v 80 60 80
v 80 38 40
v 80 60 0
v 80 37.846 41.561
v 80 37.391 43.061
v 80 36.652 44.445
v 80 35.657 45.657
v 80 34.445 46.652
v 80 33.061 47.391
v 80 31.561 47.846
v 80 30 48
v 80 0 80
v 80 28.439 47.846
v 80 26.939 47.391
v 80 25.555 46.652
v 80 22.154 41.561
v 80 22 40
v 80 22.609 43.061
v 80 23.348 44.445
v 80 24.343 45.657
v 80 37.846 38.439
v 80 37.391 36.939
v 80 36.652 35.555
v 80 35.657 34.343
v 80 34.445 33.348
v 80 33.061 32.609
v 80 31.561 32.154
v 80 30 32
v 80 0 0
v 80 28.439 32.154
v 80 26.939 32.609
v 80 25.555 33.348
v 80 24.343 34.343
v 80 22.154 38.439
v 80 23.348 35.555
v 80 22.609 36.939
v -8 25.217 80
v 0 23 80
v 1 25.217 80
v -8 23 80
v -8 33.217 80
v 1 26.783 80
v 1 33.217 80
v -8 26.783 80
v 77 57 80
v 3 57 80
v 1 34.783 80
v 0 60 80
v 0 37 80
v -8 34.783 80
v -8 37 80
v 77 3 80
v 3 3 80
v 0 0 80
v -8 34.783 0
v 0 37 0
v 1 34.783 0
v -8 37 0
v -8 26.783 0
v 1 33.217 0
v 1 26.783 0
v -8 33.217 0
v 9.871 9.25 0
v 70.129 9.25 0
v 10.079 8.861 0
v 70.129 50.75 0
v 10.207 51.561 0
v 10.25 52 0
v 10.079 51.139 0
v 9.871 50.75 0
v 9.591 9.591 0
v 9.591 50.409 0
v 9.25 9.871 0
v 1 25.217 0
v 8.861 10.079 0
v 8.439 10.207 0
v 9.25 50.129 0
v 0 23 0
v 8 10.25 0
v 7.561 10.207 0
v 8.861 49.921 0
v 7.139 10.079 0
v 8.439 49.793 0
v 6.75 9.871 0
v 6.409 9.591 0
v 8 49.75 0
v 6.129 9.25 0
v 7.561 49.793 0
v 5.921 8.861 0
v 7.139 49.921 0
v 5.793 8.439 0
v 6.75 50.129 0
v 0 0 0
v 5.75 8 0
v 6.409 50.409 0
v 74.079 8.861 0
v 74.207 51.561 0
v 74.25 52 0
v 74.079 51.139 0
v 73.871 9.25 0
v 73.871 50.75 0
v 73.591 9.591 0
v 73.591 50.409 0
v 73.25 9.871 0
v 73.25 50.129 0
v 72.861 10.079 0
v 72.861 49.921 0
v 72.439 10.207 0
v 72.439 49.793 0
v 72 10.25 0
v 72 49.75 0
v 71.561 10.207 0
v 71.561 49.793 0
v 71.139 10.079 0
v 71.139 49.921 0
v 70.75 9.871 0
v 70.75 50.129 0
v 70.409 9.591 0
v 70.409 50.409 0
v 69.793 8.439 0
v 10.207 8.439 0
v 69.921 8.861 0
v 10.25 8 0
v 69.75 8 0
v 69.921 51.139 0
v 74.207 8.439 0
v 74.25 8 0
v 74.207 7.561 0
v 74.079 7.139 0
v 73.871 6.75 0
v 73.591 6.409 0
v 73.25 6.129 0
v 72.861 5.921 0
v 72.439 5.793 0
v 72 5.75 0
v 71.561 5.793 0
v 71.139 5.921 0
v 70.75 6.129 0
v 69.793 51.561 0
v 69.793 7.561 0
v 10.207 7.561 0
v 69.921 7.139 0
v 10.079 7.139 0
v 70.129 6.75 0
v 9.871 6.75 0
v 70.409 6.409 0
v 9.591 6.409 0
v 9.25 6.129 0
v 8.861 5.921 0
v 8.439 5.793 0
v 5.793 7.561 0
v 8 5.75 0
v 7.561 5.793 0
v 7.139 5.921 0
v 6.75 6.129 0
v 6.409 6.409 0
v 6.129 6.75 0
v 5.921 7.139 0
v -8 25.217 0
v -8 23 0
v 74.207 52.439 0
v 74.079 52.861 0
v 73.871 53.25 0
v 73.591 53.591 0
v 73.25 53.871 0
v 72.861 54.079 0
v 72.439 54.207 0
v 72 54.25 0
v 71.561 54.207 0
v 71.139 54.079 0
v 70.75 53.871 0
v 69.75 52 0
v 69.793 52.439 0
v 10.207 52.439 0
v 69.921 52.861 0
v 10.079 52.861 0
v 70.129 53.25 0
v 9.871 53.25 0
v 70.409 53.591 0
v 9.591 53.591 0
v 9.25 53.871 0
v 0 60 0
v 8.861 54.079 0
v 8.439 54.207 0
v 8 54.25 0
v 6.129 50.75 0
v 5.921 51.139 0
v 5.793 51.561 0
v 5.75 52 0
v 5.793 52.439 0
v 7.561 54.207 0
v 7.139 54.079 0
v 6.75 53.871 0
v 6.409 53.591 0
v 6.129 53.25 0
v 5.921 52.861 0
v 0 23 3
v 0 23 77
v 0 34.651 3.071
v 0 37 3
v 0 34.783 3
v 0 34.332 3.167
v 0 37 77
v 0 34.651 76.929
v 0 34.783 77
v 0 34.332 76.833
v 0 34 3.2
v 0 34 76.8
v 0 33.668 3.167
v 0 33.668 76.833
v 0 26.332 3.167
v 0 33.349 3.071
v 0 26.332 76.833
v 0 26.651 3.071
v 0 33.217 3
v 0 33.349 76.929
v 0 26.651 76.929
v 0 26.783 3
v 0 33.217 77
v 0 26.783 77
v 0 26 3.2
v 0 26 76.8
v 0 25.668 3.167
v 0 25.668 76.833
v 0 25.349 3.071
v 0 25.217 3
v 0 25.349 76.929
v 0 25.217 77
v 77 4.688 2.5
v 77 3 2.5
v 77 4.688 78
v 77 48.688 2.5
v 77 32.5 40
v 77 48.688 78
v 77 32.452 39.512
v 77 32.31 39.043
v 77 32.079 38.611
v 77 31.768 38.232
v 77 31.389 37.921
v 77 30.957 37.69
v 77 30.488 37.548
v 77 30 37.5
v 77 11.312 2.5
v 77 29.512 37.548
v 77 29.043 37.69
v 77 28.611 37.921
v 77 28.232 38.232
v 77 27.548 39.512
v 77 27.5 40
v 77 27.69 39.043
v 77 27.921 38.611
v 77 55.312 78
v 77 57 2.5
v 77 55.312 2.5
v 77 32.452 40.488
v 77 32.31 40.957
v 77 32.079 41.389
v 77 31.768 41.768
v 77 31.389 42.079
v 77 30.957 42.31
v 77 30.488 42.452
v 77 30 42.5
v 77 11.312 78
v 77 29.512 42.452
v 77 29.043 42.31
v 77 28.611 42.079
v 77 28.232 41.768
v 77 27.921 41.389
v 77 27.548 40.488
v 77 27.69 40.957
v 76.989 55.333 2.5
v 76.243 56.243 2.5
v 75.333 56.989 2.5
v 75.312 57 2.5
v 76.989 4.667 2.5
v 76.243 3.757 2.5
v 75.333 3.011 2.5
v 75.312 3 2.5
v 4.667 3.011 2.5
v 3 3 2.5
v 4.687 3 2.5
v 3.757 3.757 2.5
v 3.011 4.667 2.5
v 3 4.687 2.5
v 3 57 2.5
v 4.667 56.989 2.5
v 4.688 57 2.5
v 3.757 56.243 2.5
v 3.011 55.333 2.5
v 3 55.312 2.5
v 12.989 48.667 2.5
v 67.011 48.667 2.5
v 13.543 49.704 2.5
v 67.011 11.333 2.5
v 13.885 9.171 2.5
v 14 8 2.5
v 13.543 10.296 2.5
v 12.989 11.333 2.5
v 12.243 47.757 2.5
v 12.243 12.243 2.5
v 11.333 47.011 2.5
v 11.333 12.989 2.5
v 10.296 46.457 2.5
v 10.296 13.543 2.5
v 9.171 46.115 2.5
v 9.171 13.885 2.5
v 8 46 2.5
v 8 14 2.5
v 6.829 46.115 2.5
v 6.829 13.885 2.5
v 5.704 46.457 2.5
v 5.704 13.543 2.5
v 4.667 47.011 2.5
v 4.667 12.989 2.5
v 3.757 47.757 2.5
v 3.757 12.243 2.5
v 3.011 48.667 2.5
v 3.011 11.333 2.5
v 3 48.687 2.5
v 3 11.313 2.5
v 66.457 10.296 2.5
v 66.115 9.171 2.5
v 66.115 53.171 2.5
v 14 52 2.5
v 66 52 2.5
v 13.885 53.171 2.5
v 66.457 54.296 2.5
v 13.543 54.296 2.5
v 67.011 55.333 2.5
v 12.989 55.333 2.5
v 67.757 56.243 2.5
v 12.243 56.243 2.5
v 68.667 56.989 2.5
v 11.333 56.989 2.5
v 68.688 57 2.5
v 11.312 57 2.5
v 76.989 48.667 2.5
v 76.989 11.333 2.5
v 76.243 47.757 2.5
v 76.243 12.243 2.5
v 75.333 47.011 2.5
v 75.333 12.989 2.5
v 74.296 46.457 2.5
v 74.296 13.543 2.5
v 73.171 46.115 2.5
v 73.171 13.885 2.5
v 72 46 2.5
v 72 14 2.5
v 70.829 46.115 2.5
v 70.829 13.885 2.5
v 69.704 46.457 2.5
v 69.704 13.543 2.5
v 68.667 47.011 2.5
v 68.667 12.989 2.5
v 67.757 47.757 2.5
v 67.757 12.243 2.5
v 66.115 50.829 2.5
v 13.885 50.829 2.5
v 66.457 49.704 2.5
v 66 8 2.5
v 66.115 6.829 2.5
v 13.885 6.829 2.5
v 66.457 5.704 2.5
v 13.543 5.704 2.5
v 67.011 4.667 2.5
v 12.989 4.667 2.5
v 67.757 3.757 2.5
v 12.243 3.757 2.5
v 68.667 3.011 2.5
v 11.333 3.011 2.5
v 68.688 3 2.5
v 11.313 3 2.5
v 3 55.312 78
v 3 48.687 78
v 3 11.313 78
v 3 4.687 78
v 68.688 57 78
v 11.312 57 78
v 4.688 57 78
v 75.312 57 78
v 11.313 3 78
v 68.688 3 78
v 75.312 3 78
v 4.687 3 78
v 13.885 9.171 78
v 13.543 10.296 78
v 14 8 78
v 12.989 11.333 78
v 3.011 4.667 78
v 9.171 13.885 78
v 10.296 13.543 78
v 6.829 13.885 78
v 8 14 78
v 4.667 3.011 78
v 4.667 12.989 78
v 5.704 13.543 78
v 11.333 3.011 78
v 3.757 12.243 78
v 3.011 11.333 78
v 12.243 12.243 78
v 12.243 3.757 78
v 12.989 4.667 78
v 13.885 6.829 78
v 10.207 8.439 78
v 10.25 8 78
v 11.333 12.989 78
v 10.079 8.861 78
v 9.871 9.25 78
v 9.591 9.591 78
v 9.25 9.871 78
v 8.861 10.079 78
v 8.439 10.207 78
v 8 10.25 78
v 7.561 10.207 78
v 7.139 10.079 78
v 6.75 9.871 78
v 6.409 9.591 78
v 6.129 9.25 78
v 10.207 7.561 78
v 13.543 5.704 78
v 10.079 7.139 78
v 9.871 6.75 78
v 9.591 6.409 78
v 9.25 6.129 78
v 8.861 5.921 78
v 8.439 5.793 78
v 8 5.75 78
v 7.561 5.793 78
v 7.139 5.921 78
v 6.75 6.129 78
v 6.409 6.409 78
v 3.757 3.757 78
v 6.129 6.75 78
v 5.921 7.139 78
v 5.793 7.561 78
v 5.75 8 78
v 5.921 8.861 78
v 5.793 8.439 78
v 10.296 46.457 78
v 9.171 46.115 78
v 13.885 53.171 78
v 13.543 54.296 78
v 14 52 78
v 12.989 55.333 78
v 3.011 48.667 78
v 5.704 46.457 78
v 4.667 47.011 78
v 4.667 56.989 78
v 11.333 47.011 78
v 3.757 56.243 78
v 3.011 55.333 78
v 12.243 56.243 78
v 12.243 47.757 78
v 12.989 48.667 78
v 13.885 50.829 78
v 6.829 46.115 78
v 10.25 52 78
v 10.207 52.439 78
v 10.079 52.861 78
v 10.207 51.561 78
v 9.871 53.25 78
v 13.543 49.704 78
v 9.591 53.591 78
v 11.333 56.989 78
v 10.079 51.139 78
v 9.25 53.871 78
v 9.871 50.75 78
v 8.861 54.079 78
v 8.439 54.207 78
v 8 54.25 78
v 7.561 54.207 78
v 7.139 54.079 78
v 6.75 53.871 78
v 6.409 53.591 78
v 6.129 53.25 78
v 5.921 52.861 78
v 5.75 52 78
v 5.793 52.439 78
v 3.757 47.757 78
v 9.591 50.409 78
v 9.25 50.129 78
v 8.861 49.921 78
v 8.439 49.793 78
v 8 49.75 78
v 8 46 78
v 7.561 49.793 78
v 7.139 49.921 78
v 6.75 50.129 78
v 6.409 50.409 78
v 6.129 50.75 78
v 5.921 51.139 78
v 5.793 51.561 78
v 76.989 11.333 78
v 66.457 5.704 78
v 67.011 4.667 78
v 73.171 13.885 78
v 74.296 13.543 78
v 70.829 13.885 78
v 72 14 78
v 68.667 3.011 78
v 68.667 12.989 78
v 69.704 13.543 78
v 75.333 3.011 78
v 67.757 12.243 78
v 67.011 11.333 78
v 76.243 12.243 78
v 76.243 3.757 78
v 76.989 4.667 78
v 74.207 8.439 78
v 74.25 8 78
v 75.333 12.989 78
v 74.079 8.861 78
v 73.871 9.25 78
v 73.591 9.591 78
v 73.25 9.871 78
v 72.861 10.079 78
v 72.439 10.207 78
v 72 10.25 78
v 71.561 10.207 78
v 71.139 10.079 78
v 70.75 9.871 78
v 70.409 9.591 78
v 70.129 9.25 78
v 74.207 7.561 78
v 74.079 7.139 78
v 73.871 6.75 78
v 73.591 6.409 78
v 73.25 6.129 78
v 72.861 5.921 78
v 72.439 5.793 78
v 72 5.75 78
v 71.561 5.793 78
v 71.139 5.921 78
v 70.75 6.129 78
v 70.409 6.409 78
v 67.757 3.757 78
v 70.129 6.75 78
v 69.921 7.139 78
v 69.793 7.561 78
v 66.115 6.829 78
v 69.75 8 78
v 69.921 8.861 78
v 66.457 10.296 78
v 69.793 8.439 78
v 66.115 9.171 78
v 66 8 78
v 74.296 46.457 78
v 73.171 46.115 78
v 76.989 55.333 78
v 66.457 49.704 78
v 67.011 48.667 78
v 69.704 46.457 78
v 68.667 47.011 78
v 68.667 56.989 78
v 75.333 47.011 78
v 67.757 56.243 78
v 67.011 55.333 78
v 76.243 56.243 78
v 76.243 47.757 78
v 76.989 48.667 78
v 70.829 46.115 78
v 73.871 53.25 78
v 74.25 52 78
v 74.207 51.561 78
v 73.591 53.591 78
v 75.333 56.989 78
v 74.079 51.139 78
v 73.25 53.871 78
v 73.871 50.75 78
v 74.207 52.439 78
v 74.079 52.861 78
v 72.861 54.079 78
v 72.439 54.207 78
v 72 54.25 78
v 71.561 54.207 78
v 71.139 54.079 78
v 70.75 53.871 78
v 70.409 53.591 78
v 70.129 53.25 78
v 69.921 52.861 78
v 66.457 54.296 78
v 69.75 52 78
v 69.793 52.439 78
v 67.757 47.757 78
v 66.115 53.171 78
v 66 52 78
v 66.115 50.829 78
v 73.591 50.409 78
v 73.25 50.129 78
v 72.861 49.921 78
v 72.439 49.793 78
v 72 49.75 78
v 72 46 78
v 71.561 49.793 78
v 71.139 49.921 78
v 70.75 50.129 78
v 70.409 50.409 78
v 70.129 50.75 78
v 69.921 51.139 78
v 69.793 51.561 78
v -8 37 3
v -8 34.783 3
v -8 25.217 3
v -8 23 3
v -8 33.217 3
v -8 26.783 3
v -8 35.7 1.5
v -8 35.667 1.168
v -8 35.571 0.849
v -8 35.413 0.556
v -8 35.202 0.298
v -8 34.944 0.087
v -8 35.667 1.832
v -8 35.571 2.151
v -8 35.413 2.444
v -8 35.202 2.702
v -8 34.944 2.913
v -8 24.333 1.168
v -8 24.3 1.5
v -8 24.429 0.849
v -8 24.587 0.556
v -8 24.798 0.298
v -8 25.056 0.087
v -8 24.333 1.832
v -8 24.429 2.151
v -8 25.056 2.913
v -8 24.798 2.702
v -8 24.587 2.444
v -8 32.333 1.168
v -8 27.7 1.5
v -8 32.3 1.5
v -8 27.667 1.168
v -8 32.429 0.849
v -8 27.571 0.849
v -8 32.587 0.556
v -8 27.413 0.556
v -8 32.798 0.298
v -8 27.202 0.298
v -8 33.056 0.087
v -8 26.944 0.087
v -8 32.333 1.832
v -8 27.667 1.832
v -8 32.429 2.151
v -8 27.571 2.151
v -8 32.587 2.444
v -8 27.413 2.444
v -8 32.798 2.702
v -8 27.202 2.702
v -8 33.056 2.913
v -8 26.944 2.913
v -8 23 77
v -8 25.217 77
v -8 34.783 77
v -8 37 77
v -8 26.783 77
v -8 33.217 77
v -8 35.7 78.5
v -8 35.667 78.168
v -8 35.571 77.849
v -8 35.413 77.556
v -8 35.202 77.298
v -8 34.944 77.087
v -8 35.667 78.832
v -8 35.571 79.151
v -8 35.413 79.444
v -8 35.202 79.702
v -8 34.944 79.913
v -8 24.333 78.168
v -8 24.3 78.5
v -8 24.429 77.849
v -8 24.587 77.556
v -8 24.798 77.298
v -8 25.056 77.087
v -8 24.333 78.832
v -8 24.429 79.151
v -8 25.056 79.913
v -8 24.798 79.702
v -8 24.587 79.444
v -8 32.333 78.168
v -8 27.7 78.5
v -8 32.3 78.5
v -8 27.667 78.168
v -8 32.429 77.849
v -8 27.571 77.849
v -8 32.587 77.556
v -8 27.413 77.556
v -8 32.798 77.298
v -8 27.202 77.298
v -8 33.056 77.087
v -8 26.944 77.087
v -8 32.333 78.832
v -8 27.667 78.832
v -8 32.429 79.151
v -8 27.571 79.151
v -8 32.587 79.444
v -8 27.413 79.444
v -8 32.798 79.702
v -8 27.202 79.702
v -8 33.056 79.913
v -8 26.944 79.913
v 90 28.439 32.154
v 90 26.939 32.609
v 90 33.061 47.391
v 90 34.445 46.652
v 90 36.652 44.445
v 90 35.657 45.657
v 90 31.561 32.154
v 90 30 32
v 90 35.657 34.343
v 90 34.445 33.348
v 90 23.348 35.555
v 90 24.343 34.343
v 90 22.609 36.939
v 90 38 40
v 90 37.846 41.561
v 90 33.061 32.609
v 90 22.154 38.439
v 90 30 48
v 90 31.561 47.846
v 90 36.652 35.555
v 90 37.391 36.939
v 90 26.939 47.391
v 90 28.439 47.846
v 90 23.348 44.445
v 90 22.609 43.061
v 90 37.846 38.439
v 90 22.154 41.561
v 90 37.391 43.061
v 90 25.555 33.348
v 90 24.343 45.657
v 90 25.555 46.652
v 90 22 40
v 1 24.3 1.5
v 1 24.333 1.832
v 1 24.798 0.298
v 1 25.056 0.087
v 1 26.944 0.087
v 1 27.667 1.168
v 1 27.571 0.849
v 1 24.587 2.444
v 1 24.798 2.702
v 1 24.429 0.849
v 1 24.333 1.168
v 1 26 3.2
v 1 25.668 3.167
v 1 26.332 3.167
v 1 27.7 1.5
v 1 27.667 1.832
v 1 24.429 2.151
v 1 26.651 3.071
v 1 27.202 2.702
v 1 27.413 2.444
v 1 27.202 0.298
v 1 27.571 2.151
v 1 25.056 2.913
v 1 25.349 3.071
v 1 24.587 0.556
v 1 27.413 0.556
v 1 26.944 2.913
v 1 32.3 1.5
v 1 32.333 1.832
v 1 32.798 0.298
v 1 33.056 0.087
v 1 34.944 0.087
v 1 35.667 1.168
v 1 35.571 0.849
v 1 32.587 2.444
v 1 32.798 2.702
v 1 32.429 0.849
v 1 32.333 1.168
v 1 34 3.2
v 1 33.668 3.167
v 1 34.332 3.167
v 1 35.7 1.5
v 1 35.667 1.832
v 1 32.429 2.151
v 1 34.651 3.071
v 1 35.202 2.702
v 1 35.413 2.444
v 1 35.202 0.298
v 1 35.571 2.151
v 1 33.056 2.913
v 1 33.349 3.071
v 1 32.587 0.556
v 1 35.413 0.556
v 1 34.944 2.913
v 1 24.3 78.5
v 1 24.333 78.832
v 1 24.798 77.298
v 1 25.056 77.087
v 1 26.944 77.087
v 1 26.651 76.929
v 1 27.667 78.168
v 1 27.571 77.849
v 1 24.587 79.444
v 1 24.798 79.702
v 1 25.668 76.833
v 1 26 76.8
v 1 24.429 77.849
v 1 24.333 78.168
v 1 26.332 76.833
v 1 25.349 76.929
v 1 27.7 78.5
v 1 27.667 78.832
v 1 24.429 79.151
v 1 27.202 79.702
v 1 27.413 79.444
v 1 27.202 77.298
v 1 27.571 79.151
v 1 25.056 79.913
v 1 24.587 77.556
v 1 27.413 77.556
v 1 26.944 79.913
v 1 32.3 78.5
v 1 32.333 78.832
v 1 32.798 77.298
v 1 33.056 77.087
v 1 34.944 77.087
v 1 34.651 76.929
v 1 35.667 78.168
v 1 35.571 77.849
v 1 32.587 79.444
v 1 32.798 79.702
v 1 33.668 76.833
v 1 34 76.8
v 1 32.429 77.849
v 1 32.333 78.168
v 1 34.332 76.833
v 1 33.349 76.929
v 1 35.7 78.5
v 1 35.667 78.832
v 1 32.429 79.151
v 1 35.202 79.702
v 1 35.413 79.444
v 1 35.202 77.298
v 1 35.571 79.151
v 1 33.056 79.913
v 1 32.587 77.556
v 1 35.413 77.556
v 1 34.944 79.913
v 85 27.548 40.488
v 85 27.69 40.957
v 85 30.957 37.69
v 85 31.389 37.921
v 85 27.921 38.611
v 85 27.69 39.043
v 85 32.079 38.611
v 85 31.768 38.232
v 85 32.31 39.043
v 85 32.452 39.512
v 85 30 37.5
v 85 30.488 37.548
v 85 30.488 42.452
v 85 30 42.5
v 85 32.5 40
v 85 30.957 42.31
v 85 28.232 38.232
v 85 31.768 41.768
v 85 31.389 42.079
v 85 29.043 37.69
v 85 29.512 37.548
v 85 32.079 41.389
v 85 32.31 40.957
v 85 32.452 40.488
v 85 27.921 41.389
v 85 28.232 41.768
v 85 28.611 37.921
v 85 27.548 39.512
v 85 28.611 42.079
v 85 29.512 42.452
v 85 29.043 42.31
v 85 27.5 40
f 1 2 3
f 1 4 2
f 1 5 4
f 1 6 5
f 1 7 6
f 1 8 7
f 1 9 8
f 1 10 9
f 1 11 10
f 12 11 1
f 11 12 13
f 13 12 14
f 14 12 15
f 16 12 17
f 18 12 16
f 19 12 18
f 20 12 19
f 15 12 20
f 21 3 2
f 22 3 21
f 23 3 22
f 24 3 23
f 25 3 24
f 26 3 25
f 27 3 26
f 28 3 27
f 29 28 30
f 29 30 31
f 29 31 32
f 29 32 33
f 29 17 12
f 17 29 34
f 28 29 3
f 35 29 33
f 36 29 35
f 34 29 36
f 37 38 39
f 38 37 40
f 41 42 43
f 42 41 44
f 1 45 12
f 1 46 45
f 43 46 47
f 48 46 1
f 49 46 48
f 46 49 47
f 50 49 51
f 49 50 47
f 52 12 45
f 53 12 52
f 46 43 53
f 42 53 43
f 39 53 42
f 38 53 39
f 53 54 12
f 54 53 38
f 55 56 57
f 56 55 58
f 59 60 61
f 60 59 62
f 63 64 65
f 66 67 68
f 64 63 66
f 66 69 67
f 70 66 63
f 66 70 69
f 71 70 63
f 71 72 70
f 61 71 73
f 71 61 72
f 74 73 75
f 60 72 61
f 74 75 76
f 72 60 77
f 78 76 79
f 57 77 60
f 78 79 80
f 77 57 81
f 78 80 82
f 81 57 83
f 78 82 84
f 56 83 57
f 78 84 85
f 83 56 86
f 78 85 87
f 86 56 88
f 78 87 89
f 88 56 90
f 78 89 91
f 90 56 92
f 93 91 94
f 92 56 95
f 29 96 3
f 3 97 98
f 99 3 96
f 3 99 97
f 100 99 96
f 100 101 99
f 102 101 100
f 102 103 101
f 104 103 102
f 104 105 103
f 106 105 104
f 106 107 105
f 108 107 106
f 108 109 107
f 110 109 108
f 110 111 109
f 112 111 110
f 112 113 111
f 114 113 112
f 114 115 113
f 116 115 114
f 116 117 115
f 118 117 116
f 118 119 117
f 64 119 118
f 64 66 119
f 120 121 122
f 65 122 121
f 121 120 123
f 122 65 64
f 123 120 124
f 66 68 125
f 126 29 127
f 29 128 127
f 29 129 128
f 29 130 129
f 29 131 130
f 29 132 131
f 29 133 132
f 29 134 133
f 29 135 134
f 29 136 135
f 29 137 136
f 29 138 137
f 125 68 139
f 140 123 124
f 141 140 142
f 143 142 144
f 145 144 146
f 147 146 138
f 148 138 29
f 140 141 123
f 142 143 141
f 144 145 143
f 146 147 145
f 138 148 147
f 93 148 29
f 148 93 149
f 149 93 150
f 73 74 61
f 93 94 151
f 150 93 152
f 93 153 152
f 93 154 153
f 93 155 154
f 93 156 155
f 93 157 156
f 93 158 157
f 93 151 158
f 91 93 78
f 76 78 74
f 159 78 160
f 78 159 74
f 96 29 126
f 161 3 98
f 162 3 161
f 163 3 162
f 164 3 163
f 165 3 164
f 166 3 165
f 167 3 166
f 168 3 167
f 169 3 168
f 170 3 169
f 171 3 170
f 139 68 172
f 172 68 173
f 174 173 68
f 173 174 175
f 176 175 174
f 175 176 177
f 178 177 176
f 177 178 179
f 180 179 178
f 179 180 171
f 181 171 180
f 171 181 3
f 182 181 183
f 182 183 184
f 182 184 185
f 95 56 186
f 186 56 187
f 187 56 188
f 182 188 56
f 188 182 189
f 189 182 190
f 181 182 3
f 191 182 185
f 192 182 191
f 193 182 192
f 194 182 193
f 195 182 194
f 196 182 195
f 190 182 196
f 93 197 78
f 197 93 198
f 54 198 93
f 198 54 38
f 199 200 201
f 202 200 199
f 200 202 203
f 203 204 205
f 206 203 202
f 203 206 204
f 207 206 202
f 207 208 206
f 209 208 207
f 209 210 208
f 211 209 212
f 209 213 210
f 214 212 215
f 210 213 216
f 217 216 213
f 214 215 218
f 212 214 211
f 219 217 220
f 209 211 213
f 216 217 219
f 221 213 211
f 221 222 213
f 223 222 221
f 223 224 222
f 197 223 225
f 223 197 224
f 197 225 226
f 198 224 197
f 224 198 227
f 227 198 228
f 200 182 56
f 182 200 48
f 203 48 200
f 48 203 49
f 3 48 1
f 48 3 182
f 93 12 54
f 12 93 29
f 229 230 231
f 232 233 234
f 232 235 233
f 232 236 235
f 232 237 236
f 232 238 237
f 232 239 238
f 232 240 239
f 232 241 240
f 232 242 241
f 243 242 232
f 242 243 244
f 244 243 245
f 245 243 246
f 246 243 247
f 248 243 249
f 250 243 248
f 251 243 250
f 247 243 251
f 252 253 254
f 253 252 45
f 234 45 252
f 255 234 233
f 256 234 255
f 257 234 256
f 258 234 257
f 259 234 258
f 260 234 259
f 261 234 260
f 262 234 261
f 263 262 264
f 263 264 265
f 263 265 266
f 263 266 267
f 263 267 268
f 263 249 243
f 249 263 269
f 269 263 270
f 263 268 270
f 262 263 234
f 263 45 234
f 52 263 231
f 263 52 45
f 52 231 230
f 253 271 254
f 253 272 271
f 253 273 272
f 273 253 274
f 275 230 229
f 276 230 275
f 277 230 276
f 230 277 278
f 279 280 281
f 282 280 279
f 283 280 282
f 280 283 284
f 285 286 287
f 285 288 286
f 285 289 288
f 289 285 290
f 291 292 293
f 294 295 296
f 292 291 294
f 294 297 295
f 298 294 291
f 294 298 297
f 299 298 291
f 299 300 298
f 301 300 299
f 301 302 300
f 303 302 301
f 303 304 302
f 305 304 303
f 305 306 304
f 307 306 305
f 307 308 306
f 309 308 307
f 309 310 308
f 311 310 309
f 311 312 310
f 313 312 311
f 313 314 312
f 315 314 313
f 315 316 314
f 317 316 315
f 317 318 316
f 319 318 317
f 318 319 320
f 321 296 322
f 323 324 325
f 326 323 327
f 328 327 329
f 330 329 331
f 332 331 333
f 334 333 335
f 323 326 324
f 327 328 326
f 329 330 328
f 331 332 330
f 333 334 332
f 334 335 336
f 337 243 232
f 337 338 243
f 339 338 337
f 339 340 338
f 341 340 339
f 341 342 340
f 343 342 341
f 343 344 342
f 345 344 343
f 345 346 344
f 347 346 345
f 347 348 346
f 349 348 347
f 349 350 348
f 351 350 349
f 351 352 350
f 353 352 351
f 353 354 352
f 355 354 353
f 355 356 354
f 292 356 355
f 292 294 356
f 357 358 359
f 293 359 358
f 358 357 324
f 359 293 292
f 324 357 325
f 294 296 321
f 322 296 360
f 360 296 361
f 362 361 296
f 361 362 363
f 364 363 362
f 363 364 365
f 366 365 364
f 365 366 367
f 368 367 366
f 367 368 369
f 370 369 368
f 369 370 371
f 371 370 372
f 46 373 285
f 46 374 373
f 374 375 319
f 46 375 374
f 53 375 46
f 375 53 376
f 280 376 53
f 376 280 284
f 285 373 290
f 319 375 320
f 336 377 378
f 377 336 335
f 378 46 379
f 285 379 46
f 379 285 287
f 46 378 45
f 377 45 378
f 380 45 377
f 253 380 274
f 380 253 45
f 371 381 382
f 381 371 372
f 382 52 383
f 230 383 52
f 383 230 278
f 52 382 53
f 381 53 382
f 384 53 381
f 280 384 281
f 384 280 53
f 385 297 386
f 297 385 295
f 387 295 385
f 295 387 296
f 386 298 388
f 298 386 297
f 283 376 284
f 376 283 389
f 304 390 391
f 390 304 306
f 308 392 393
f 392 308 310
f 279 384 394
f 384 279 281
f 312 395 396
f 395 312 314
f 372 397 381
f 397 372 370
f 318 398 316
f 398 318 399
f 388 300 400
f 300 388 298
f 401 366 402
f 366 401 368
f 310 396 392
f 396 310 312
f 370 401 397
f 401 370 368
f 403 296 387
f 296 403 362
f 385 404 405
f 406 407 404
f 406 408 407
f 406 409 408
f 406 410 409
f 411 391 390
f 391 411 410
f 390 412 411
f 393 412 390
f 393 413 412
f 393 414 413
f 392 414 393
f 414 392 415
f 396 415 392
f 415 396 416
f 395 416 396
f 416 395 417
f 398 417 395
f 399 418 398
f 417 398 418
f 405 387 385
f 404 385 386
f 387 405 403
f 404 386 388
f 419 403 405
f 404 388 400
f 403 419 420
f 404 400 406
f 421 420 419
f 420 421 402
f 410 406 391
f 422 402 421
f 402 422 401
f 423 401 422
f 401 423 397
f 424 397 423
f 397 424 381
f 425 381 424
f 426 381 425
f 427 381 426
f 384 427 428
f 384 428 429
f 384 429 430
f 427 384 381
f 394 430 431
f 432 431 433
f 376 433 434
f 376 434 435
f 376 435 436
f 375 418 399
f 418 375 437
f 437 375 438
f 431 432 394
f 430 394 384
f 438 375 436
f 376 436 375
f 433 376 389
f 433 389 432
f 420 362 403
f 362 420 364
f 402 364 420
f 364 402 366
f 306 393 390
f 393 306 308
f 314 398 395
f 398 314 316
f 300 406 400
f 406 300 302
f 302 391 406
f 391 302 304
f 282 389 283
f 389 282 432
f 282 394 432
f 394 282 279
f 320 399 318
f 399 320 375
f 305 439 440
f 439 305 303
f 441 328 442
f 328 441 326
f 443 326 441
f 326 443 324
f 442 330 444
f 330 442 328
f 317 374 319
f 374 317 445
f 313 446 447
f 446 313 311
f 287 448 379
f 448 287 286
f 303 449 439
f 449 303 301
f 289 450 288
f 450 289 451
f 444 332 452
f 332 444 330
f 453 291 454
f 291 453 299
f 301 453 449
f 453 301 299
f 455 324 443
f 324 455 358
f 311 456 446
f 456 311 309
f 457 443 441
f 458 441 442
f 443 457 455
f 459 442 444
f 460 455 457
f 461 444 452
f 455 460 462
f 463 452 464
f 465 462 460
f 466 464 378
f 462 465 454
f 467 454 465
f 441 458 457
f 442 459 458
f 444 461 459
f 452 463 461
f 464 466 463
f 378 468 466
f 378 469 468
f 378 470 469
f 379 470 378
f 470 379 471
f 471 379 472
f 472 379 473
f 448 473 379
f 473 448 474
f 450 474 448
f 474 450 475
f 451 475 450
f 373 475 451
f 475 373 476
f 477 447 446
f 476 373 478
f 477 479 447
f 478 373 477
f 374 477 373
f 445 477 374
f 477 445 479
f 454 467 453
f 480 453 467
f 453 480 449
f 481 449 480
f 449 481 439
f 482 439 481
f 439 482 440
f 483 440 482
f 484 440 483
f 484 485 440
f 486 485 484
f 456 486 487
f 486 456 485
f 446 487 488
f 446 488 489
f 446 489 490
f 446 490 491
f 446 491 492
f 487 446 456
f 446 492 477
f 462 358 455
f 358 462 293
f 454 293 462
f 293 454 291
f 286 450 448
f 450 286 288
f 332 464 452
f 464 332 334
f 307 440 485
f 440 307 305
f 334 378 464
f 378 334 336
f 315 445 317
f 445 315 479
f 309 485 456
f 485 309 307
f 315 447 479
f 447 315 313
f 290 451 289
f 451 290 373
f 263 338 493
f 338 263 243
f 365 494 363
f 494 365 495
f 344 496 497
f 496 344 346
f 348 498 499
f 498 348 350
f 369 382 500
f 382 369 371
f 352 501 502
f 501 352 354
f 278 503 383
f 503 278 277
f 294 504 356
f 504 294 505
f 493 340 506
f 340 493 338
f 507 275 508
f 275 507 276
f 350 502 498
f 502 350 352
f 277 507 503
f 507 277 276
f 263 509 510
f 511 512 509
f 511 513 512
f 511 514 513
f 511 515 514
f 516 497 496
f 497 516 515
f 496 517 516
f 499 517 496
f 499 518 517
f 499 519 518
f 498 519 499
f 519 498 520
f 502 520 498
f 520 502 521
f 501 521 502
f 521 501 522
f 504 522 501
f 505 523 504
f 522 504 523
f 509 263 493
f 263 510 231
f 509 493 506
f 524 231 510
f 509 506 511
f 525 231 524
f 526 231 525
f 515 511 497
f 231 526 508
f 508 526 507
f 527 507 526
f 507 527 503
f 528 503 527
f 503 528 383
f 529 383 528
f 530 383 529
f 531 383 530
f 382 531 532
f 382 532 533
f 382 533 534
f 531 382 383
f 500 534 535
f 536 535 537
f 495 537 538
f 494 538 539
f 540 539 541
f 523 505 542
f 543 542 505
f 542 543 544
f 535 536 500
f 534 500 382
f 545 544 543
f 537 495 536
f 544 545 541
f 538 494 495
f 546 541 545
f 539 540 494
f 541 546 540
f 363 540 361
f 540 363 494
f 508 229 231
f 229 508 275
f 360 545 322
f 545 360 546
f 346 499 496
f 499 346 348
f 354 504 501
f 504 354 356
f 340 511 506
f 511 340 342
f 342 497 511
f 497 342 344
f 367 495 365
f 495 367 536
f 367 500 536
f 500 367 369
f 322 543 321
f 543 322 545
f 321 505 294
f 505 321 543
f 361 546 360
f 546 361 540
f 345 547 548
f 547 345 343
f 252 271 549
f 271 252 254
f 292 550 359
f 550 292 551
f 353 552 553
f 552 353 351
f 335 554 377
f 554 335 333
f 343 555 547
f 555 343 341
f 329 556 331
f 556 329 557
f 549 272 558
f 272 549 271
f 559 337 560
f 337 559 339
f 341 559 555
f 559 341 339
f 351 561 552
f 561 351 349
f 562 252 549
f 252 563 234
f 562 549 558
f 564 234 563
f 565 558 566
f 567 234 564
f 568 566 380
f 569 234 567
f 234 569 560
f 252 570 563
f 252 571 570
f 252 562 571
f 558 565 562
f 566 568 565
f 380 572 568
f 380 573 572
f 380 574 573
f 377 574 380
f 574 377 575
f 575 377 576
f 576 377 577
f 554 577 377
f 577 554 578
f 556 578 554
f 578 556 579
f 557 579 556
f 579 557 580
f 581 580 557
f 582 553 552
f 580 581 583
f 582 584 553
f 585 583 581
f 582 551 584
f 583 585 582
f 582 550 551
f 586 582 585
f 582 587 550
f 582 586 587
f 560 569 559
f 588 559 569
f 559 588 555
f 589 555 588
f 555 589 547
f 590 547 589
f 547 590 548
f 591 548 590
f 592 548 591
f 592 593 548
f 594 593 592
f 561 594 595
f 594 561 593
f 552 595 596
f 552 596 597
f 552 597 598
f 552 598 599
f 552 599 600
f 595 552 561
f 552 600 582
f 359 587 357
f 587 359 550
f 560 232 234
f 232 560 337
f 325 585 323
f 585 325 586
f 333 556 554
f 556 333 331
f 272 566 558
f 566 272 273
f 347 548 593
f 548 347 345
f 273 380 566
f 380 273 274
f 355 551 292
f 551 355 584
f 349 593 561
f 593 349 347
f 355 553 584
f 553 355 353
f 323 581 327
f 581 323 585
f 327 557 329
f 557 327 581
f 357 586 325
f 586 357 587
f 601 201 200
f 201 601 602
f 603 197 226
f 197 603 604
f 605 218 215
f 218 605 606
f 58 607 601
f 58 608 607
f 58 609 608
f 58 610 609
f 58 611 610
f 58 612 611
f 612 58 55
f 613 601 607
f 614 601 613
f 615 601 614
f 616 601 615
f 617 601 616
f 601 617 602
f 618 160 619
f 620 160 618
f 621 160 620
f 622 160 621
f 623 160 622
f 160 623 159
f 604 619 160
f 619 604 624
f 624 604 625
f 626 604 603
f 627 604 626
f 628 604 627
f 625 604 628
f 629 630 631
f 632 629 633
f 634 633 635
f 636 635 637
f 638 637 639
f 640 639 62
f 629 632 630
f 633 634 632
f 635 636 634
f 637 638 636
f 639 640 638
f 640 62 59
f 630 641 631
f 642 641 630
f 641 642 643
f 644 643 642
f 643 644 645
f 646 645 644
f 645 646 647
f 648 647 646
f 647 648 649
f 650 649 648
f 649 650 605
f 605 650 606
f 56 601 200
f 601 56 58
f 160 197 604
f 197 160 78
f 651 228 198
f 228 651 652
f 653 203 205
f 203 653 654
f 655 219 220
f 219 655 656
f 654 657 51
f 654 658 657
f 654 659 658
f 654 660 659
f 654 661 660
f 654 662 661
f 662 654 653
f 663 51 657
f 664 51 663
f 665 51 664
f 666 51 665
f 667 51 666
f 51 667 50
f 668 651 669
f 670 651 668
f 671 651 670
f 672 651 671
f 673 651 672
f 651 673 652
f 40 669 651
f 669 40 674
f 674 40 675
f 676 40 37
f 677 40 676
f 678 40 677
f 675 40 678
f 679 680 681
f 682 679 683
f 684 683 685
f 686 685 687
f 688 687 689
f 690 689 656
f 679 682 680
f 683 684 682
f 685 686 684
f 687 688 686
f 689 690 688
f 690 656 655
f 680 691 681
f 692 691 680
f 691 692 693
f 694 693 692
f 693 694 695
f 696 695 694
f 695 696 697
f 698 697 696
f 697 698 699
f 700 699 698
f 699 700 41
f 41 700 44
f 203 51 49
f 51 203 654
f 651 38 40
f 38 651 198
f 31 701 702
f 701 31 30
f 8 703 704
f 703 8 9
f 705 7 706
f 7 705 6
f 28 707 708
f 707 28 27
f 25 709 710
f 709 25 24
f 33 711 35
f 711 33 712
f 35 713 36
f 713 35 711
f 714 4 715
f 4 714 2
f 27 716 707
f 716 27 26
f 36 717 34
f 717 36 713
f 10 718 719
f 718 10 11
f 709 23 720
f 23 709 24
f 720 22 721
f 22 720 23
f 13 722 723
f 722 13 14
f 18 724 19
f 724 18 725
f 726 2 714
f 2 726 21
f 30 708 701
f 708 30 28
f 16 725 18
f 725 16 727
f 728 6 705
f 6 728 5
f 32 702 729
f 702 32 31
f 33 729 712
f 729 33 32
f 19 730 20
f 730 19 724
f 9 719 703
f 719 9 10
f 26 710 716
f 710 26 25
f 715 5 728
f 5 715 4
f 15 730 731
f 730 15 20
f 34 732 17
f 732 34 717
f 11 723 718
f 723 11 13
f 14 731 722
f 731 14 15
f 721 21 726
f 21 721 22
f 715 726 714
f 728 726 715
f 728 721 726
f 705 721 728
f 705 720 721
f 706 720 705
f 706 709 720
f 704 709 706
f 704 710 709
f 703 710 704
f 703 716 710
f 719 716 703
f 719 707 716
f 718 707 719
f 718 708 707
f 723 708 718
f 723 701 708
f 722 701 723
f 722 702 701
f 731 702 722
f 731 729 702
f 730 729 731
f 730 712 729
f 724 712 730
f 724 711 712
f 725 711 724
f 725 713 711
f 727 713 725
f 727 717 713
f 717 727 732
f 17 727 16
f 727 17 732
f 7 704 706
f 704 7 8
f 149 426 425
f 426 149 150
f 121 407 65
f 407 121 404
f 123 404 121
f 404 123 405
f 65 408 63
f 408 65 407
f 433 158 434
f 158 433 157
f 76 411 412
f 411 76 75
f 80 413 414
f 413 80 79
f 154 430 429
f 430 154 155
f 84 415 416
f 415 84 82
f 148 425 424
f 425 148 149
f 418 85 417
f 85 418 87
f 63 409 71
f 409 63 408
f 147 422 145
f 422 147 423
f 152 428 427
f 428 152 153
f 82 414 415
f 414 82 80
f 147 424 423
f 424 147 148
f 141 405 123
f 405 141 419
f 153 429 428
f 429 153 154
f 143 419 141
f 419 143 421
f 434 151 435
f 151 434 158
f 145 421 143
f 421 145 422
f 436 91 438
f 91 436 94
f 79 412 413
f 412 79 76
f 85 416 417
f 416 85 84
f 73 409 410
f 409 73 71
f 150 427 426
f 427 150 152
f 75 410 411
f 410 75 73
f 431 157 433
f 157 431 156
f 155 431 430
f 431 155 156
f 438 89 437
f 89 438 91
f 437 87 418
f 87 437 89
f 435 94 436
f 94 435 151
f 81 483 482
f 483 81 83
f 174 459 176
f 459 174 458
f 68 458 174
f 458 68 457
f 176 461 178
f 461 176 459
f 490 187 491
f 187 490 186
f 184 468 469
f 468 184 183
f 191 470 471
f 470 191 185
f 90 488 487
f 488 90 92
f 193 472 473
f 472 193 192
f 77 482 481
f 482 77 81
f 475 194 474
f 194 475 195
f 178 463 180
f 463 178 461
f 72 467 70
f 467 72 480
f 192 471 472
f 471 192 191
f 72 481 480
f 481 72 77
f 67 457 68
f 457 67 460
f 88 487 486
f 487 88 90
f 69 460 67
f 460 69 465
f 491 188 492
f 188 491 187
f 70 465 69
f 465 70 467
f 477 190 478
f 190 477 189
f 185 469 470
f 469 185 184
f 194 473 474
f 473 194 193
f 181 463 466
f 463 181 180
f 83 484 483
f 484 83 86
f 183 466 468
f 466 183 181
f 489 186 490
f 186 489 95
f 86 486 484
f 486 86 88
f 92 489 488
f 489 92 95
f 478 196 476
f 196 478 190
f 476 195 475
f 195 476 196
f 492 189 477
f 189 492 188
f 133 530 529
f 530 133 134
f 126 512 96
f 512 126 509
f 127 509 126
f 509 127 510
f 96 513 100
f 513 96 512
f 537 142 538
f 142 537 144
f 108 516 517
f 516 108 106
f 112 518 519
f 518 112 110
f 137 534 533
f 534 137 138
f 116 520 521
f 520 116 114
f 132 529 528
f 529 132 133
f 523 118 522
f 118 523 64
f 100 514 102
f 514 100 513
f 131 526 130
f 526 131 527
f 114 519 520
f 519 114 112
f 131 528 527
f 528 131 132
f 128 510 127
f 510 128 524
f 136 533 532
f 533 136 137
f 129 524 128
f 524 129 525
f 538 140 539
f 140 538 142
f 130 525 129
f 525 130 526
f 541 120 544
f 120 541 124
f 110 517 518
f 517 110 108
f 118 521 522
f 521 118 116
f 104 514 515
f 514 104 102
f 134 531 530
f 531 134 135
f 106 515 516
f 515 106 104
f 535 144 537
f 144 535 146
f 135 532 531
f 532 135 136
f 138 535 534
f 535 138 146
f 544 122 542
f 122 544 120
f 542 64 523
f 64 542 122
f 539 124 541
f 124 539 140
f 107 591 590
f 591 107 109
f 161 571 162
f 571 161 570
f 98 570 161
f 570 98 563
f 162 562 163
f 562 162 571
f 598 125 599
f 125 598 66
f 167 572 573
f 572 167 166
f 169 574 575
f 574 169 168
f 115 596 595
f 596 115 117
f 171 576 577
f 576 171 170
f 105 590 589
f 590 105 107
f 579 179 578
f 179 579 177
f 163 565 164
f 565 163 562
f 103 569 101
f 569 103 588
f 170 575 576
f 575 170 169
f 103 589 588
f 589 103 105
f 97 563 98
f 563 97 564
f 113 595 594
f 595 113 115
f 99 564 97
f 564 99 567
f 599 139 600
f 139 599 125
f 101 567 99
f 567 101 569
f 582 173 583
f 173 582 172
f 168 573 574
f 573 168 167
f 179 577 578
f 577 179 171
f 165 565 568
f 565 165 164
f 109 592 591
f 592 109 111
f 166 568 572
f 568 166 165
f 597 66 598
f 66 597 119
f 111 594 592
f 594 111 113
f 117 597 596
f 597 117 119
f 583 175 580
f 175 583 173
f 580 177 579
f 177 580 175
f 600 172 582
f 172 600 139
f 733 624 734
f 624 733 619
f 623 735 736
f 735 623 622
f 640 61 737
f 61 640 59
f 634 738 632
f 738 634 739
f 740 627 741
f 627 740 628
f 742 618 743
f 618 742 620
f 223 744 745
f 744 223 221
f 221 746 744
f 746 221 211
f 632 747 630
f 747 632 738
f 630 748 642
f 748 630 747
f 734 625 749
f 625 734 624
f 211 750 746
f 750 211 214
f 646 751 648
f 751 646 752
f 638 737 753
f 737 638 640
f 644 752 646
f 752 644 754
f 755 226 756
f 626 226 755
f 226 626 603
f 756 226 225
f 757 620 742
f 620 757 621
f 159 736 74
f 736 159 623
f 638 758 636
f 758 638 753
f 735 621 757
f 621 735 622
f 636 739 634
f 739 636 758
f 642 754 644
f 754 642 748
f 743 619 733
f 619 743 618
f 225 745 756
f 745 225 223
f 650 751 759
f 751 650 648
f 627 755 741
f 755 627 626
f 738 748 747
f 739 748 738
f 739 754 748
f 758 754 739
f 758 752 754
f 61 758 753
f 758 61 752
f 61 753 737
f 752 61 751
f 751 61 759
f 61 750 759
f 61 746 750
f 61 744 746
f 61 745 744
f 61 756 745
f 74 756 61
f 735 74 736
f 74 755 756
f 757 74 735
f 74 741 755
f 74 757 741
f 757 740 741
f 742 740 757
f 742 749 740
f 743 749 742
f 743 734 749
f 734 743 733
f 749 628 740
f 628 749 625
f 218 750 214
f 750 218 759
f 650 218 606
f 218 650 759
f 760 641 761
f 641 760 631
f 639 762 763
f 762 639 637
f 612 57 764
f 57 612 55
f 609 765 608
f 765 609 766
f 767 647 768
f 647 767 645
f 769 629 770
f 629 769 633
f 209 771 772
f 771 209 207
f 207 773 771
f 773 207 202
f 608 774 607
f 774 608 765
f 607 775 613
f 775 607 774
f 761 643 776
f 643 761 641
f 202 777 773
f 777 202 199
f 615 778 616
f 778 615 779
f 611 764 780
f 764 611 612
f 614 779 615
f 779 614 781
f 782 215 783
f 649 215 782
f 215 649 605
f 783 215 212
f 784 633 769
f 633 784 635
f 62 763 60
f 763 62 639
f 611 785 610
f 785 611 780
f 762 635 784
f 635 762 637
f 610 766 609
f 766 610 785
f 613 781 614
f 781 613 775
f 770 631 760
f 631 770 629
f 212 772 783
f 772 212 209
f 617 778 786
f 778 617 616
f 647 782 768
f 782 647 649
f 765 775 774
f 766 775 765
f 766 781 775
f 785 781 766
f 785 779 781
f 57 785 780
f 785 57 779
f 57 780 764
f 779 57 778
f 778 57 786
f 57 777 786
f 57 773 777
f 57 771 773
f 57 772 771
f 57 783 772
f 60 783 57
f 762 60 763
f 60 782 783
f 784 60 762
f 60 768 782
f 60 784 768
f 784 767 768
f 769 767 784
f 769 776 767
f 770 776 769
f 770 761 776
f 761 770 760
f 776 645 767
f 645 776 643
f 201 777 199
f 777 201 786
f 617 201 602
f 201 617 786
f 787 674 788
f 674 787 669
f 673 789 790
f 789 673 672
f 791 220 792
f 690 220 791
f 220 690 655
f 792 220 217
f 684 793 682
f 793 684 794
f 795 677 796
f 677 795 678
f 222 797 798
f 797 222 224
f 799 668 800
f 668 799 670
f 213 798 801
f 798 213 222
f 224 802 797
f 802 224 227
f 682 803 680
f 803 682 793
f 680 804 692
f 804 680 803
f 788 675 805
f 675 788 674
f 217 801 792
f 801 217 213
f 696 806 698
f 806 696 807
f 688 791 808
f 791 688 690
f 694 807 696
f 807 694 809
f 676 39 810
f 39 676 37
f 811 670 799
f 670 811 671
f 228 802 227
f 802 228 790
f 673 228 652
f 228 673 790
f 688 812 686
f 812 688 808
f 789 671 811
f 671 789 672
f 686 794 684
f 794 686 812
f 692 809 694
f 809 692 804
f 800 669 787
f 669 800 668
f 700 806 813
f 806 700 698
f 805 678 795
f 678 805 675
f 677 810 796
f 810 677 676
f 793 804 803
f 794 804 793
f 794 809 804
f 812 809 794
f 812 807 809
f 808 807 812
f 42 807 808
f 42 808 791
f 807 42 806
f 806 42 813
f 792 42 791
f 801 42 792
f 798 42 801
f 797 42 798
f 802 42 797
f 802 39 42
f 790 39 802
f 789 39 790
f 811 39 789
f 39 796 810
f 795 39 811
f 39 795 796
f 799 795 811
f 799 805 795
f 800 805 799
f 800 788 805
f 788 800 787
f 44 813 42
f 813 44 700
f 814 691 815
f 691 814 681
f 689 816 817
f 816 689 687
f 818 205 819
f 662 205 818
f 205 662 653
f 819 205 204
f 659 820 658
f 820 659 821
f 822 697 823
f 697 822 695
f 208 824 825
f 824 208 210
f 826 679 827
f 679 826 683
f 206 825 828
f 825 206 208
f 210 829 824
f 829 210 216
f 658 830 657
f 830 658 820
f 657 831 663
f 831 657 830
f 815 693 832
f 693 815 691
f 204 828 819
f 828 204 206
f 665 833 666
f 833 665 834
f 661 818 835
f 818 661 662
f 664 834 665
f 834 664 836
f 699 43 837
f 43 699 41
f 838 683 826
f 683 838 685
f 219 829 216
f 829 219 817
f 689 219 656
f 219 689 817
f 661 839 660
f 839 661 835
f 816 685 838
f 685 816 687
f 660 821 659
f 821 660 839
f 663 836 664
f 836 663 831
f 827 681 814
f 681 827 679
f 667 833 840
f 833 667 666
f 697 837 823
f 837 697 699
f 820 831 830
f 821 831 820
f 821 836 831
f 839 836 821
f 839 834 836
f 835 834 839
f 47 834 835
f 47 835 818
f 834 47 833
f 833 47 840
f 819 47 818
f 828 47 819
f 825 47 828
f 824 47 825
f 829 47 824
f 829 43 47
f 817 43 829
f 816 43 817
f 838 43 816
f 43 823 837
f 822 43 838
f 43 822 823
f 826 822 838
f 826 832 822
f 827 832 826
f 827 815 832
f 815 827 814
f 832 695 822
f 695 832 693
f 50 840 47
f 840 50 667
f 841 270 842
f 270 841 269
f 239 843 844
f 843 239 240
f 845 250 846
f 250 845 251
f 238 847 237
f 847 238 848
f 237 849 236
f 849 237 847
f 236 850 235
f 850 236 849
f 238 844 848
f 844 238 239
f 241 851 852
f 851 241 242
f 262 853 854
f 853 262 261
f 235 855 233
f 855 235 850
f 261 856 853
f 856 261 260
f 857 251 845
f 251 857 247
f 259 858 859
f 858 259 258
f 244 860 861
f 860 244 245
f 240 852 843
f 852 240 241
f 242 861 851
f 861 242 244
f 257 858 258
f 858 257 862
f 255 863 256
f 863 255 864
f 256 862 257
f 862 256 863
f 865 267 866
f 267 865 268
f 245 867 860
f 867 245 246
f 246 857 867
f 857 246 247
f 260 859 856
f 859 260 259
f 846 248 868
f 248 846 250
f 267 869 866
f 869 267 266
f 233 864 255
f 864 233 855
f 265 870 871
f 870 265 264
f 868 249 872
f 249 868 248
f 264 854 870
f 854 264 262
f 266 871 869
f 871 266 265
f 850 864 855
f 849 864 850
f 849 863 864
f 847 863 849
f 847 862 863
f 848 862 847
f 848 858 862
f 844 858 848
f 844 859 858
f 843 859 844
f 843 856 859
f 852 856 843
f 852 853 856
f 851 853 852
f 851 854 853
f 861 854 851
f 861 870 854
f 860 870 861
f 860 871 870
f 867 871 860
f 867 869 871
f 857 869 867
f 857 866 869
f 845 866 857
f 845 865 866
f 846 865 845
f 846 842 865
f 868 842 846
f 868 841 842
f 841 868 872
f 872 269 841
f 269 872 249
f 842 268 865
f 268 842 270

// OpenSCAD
$fn = 32;

// ----------------------------------------------------------------------
// Enclosure body: 80 x 60 x 80 mm, wall 3 mm
// ----------------------------------------------------------------------

// --- parameters (mm) ---
length = 80;              // outside length, X
width = 60;               // outside width, Y
height = 80;              // outside height, Z
wall = 3;                 // side wall thickness
floor_t = 2.5;            // floor thickness
boss_d = 12;              // corner boss diameter
boss_h = 75.5;            // corner boss height above the floor
boss_hole_d = 4.5;        // lid screw clearance in the boss
boss_lip = 8;             // boss centre inset from the corner
ear_w = 14;               // mounting ear width
ear_t = 3;                // mounting ear thickness
ear_ext = 8;              // mounting ear reach
ear_hole_d = 3.4;         // mounting ear drills
nipple_d = 16;            // cable gland boss diameter
nipple_h = 10;            // cable gland boss height
nipple_bore = 5;          // cable gland bore

module shell() {
  difference() {
    cube([length, width, height]);
    /* hollow, open at the top */
    translate([wall, wall, floor_t])
      cube([length - 2 * wall, width - 2 * wall, height]);
  }
}

module bosses() {
  /* corner bosses, sunk 1 mm into the floor */
  for (sx = [0, 1]) for (sy = [0, 1])
    translate([sx * (length - 2 * boss_lip) + boss_lip, sy * (width - 2 * boss_lip) + boss_lip, floor_t - 1])
      cylinder(h = boss_h + 1, d = boss_d);
}

module gland() {
  /* boss on the short wall, sunk 1 mm into it */
  translate([length - 1, width / 2, height * 0.5]) rotate([0, 90, 0])
    cylinder(h = nipple_h + 1, d = nipple_d);
}

module ears() {
  /* mounting ears on the short walls, sunk into the wall */
  for (sz = [0, 1])
    translate([-ear_ext, width / 2 - ear_w / 2, sz * (height - ear_t)])
      cube([ear_ext + 2.5, ear_w, ear_t]);
}

difference() {
  union() {
    shell();
    bosses();
    gland();
    ears();
  }
  /* boss screw holes */
  for (sx = [0, 1]) for (sy = [0, 1])
    translate([sx * (length - 2 * boss_lip) + boss_lip, sy * (width - 2 * boss_lip) + boss_lip, -1]) cylinder(h = floor_t + boss_h + 2, d = boss_hole_d);
  translate([length, width / 2, height * 0.5]) rotate([0, 90, 0]) translate([0, 0, -nipple_h - 2]) cylinder(h = nipple_h + wall + 4, d = nipple_bore);
  for (sz = [0, 1]) for (sx = [0, 1]) translate([-ear_ext - 1, width / 2 + (2 * sx - 1) * (ear_w / 2 - 3), sz * (height - ear_t) + ear_t / 2]) rotate([0, 90, 0]) cylinder(h = ear_ext + 2, d = ear_hole_d);
}
